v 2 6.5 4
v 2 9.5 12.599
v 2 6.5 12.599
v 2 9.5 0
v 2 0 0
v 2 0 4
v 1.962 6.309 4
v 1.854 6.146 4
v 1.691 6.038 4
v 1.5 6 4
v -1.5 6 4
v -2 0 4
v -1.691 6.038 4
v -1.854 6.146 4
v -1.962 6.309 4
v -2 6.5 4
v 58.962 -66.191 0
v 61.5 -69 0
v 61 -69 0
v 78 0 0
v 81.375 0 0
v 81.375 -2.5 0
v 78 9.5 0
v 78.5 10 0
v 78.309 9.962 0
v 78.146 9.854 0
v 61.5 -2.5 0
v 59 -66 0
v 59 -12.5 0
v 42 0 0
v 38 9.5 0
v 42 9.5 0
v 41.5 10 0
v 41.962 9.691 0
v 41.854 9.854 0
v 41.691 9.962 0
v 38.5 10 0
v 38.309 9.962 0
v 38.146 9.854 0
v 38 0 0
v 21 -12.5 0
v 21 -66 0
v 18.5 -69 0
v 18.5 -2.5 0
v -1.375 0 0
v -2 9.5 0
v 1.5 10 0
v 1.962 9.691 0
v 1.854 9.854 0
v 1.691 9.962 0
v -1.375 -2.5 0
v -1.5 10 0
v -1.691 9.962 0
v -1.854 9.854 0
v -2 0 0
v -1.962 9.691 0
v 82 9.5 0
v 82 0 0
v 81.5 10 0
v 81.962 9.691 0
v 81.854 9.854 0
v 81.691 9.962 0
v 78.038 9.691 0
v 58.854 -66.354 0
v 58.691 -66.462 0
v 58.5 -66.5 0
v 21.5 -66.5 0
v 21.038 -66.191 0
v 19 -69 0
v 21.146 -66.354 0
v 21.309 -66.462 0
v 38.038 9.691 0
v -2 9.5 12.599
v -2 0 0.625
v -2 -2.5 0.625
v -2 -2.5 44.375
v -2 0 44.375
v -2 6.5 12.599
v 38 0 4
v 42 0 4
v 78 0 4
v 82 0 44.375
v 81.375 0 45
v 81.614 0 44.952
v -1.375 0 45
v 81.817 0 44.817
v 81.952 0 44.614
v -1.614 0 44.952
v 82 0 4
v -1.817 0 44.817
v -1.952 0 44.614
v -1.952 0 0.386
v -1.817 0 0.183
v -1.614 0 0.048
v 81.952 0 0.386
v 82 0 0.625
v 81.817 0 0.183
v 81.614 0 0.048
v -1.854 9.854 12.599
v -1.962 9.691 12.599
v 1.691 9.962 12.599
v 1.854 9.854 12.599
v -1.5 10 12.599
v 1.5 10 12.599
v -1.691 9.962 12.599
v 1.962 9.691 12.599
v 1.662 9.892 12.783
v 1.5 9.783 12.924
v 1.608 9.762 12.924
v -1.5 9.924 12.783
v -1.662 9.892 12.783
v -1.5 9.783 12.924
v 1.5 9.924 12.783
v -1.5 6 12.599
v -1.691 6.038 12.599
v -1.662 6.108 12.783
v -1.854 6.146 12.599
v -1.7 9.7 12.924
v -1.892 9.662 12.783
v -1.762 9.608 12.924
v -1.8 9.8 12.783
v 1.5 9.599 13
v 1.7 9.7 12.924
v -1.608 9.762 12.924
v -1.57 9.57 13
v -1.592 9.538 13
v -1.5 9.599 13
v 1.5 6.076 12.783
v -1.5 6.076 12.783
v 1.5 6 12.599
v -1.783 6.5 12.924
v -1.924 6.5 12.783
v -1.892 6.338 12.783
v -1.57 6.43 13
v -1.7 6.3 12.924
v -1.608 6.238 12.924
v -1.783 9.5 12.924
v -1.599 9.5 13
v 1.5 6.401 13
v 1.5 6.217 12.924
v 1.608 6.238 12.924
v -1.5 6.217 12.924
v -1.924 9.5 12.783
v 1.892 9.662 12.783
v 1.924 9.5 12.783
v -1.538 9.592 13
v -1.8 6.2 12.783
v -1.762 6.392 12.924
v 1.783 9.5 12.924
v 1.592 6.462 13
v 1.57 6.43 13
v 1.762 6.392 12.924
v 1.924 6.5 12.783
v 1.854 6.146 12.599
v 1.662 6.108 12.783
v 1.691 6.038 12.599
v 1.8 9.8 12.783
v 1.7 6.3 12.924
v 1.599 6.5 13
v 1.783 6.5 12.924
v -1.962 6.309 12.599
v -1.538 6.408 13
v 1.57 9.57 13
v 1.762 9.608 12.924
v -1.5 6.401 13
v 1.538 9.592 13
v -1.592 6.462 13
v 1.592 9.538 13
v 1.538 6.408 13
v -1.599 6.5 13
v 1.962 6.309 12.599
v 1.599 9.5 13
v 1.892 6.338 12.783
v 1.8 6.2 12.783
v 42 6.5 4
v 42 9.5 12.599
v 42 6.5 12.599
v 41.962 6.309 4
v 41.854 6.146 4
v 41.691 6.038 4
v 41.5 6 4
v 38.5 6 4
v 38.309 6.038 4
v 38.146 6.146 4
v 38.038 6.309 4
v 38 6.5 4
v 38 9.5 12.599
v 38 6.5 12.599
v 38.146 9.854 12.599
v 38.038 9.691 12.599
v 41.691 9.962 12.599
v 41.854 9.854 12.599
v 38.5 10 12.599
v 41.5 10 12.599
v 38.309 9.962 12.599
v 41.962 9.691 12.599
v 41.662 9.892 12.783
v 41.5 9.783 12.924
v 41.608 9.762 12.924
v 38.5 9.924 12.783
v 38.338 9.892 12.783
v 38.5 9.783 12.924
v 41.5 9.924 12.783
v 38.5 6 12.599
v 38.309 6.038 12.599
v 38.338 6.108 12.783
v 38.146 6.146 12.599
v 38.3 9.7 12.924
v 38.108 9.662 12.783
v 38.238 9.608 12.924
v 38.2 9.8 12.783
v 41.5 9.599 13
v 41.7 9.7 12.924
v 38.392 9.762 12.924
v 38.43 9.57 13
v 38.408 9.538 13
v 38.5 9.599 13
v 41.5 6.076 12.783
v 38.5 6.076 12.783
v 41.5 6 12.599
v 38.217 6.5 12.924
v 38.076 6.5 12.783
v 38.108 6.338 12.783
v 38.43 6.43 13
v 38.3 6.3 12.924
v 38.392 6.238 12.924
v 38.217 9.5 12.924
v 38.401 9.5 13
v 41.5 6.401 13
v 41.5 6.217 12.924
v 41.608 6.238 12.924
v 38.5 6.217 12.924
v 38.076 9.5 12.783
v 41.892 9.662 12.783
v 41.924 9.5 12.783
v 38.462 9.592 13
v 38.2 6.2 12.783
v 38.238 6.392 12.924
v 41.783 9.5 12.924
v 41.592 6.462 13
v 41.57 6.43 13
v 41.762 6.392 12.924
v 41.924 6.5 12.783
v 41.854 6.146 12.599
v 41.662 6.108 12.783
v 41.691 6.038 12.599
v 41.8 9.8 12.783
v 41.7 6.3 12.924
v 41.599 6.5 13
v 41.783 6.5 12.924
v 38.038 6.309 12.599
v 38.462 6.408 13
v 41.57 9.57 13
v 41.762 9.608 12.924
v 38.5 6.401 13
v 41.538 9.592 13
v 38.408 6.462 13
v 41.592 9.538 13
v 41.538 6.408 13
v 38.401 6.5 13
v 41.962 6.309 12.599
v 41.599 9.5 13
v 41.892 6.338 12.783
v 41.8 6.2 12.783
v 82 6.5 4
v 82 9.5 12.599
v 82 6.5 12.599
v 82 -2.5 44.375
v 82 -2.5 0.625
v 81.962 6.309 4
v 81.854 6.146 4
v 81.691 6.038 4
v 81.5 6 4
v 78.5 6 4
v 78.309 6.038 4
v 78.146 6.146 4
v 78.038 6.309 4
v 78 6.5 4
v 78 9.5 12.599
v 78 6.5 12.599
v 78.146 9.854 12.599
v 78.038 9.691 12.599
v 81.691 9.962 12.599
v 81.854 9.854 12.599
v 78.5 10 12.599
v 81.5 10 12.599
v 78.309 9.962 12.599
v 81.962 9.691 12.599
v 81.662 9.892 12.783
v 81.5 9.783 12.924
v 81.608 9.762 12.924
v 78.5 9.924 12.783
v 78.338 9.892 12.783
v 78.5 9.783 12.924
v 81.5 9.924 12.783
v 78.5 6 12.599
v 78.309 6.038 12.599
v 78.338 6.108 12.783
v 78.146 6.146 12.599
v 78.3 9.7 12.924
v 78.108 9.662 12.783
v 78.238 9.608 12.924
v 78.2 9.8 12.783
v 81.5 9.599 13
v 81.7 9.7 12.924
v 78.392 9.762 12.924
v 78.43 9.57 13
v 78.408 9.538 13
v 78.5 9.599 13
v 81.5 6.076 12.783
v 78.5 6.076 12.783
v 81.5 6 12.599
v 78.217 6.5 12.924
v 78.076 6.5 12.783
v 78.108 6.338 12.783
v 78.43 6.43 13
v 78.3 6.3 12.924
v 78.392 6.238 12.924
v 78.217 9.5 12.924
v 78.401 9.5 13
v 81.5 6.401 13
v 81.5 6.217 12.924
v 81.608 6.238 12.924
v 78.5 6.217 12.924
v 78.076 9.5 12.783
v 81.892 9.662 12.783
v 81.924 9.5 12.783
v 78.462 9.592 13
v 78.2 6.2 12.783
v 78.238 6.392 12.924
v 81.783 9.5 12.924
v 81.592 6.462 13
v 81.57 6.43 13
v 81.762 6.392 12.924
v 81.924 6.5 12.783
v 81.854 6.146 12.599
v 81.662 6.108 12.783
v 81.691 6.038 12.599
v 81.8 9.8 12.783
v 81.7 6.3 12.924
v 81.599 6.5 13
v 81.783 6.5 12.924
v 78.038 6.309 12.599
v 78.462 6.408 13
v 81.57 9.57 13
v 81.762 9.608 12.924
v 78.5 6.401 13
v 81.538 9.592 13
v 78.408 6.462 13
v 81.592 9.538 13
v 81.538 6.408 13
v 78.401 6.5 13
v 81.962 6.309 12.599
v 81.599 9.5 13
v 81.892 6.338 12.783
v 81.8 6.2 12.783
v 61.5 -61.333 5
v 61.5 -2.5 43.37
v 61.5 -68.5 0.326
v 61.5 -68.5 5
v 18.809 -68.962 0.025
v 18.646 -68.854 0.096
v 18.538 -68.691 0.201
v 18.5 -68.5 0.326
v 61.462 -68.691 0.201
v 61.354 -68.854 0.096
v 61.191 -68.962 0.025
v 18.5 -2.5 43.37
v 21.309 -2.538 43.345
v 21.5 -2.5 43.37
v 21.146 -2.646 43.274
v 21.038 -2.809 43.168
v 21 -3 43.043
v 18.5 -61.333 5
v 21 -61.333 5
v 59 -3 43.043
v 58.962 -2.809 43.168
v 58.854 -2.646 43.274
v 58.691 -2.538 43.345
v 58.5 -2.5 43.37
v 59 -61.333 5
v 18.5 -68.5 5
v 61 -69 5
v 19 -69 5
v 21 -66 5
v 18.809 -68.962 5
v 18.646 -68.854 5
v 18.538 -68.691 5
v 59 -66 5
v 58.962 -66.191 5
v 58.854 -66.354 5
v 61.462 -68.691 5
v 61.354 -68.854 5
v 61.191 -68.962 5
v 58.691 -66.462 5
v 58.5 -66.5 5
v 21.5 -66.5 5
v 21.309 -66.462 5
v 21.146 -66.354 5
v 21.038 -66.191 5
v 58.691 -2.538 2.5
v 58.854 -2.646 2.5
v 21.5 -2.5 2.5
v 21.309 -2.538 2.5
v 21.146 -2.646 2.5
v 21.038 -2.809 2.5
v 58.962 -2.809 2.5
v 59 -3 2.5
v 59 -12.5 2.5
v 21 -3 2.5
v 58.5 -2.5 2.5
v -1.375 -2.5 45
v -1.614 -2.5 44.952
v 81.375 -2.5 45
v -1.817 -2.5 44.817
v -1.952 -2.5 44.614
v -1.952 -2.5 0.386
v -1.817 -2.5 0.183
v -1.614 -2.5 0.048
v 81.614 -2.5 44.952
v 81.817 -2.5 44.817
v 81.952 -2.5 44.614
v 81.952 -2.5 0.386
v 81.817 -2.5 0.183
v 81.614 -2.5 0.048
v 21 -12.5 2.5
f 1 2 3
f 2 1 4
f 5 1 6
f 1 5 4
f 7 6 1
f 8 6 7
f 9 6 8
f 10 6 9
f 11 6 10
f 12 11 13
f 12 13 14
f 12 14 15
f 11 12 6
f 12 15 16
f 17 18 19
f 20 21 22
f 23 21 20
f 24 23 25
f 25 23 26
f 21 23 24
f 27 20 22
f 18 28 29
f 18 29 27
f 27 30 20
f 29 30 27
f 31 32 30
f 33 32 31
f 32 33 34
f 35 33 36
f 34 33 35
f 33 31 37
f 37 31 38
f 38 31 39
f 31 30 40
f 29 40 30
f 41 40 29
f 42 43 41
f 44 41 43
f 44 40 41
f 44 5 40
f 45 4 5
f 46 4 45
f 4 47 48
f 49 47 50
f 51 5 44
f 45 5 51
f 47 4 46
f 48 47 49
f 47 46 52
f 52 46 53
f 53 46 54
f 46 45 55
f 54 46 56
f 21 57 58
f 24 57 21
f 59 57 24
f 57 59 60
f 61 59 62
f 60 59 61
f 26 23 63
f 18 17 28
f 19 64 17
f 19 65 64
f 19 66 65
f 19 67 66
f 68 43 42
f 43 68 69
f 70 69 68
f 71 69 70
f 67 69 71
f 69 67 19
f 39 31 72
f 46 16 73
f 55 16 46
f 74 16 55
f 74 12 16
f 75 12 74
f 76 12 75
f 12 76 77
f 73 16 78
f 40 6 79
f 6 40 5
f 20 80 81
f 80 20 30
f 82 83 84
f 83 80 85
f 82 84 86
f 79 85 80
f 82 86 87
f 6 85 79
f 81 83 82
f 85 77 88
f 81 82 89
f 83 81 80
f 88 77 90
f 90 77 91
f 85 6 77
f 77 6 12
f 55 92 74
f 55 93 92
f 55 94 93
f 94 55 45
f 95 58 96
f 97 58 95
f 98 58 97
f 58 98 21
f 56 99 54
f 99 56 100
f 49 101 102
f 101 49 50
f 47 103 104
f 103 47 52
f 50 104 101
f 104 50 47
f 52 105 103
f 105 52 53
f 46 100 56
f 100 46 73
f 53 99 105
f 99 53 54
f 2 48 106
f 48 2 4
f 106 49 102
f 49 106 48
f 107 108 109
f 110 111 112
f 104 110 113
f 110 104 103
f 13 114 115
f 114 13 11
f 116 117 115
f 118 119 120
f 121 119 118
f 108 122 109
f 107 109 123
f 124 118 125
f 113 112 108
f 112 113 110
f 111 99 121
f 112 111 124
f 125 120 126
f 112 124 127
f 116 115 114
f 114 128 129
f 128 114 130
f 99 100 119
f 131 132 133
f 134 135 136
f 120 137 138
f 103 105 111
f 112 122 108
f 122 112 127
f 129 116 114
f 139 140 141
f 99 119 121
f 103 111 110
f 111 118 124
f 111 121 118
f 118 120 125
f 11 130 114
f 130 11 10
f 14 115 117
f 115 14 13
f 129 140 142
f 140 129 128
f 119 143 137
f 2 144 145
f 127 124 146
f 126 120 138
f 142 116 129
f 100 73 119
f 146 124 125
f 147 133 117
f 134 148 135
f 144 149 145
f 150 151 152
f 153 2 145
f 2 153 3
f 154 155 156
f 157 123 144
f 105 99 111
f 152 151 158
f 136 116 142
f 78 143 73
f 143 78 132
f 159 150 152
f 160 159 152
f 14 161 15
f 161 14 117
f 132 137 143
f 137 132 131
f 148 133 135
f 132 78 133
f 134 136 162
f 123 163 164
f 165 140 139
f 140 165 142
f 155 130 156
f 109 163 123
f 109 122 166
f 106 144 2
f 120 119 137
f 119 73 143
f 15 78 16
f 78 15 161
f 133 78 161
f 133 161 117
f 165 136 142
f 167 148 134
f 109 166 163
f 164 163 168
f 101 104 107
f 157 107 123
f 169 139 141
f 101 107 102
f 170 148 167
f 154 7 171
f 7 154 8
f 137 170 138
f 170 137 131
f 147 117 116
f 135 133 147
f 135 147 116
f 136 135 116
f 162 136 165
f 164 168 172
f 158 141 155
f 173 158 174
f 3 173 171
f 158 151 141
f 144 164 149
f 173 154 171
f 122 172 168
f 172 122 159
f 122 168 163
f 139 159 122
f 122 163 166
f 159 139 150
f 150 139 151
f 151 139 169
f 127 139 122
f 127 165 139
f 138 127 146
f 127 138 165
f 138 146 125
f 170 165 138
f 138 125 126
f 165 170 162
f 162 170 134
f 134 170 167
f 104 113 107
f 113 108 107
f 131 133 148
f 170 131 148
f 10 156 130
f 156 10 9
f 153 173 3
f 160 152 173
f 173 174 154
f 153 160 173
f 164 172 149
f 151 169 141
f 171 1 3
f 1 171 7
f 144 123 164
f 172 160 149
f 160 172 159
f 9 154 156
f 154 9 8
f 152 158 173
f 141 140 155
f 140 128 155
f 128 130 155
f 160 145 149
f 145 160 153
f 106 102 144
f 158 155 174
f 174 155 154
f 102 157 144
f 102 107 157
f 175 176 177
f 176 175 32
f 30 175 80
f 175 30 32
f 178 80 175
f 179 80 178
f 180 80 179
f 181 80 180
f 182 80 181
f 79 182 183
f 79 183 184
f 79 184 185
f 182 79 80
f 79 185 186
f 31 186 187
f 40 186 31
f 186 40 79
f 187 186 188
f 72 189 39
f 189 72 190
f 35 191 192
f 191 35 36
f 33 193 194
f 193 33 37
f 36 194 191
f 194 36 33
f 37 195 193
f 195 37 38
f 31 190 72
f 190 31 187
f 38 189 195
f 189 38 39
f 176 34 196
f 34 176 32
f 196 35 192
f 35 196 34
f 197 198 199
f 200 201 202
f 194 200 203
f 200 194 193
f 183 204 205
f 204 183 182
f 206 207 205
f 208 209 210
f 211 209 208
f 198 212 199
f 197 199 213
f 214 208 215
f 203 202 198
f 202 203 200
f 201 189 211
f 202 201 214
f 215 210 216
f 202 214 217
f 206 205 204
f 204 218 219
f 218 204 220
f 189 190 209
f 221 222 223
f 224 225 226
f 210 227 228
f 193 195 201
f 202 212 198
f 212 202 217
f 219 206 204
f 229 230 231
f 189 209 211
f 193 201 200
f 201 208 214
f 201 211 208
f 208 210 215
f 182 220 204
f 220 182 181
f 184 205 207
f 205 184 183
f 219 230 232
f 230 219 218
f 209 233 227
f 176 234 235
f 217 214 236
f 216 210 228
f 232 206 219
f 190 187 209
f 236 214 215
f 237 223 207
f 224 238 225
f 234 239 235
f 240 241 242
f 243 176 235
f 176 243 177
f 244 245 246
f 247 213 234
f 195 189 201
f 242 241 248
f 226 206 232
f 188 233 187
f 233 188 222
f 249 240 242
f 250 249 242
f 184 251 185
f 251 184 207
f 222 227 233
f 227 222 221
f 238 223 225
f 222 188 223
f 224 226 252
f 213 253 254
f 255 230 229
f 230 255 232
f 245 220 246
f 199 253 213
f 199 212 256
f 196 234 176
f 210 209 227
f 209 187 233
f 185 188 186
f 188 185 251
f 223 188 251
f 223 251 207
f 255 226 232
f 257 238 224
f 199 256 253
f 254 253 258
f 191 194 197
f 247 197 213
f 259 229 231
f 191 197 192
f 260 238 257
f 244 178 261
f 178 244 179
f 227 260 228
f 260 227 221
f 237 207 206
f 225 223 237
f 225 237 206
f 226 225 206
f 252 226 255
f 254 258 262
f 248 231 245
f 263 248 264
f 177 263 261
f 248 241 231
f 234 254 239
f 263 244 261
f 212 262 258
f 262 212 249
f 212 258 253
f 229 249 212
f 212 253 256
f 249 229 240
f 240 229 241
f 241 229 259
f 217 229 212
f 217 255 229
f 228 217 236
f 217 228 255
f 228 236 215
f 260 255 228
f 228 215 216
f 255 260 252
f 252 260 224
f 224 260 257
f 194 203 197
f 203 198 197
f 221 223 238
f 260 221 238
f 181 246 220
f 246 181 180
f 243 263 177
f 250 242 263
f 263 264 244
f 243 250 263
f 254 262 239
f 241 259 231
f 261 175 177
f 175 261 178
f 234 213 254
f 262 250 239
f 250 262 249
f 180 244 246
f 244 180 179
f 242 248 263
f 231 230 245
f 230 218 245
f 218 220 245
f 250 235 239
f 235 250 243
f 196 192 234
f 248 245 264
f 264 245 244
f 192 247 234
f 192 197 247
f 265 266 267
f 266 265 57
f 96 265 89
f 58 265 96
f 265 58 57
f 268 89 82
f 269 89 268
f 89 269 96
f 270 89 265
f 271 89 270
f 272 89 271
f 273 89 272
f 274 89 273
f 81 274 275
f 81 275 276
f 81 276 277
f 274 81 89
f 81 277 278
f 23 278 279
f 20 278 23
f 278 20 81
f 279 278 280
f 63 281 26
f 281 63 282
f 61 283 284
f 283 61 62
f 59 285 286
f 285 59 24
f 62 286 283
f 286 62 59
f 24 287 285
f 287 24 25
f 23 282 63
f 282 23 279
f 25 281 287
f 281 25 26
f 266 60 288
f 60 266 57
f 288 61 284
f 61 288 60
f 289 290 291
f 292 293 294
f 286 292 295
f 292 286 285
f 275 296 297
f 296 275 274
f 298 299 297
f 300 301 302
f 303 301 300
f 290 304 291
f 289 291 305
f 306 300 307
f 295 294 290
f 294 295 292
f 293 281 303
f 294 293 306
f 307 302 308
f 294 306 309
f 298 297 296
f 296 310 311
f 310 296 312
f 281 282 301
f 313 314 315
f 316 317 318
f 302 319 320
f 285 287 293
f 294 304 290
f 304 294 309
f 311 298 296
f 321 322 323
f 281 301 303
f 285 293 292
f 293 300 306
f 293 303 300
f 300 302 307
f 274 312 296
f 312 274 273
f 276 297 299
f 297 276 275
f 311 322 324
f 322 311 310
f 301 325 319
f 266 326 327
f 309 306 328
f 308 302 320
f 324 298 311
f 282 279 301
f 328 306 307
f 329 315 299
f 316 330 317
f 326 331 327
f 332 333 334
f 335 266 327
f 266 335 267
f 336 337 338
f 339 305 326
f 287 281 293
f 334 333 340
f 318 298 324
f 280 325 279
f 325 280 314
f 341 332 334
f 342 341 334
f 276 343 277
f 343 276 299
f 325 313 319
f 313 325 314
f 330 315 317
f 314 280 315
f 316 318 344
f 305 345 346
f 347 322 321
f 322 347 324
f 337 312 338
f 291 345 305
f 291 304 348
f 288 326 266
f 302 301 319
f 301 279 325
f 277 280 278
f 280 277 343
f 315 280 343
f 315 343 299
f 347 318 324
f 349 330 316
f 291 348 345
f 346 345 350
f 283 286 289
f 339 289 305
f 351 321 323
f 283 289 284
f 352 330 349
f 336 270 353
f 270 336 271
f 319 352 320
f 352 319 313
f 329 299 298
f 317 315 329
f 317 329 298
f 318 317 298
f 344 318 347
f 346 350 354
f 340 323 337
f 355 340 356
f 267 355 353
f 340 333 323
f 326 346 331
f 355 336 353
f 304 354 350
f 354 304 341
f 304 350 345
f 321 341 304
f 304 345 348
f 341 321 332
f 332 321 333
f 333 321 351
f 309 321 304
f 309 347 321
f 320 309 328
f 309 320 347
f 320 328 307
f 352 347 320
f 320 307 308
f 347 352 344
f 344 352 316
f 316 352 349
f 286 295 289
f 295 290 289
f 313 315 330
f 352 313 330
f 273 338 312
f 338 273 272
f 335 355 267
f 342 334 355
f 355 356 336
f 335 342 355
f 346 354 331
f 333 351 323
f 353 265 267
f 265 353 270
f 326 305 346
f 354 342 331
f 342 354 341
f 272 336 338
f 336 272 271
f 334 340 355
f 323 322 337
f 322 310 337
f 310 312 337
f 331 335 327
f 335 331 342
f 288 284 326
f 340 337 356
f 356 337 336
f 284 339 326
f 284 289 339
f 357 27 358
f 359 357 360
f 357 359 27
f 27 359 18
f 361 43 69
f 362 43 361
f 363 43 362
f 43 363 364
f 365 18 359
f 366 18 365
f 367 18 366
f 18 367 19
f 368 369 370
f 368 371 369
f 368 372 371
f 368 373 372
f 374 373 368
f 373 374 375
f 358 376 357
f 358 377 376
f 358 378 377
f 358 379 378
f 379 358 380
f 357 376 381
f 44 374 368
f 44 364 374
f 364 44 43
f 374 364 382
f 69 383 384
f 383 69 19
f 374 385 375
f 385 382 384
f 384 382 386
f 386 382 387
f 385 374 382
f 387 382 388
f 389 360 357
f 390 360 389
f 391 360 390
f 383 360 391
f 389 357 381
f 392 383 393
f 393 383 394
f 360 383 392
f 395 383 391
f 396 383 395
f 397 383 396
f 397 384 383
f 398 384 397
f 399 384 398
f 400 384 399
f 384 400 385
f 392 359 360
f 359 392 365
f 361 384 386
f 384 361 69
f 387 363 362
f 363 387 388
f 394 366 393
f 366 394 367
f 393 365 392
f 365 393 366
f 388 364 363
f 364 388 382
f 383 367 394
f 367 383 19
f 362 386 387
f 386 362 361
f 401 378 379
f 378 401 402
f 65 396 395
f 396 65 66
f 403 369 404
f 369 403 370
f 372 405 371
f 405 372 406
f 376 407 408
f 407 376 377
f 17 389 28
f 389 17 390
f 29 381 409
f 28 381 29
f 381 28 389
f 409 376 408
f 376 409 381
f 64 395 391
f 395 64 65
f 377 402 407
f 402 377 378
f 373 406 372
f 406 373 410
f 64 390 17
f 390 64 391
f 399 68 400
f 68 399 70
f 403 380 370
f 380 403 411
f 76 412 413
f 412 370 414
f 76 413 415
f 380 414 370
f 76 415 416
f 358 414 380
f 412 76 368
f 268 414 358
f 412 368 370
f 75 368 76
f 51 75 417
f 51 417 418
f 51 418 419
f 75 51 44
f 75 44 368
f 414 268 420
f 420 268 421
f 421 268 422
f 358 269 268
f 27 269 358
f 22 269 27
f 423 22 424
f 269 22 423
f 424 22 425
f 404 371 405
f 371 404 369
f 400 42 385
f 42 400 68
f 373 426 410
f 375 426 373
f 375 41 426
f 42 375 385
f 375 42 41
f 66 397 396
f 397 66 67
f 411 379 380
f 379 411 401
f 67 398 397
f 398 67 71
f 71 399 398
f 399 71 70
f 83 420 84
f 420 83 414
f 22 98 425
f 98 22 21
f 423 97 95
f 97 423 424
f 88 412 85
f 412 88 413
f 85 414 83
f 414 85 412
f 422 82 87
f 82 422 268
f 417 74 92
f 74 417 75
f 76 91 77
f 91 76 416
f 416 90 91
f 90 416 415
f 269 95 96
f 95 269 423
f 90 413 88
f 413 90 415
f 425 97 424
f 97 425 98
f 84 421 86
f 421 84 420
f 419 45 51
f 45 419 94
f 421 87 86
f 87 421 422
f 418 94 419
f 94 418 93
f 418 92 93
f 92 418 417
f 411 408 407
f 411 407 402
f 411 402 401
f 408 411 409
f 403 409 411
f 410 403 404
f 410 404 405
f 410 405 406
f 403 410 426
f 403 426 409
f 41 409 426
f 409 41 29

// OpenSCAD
// You only need to edit the varibales prefixed with user_

// The box inner length / depth in mm
user_inner_box_length = 54; // [1:300]
// The box inner height in mm
user_inner_box_height = 40 ; // [1:300]
// The box inner width in mm
user_inner_box_width = 38; // [1:300]
// The box wall width in mm
user_wall_width = 2.5; // [1:10]
// The minimum number of hooks
user_min_hook_count = 3; // [2:20]
// The box start offset in mm
user_box_start_offset = 10; // [0:100]

// You can stop editing after this line if you do not want to brick this script ;) 

if (version()[0] < 2019) {
  echo("WARNING: This script is only tested with 2019.01!");
}

assert(undef != user_inner_box_length, "Value \"user_inner_box_length\" must be specified!");
assert(user_inner_box_length >= 1, "The minimum value is 1mm!");
assert(user_inner_box_length <= 300, "The maximum value is 300mm!");

assert(undef != user_inner_box_height, "Value \"user_inner_box_height\" must be specified!");
assert(user_inner_box_height >= 1, "The minimum value is 1mm!");
assert(user_inner_box_height <= 300, "The maximum value is 300mm!");

assert(undef != user_inner_box_width, "Value \"user_inner_box_width\" must be specified!");
assert(user_inner_box_width >= 1, "The minimum value is 1mm!");
assert(user_inner_box_width <= 300, "The maximum value is 300mm!");

assert(undef != user_wall_width, "Value \"user_wall_width\" must be specified!");
assert(user_wall_width >= 1, "The minimum value is 1mm!");
assert(user_wall_width <= 10, "The maximum value is 10mm!");

assert(undef != user_min_hook_count, "Value \"user_min_hook_count\" must be specified!");
assert(user_min_hook_count >= 2);
assert(user_min_hook_count <= 20);

assert(undef != user_box_start_offset, "Value \"user_box_start_offset\" must be specified!");
assert(user_box_start_offset >= 0);
assert(user_box_start_offset <= 100);

caco_create_ikea_skadis_pistol_style_tool_holder(
  user_inner_box_length, 
  user_inner_box_height, 
  user_inner_box_width, 
  user_wall_width,
  (user_min_hook_count - 1) * 40,
  4,
  user_box_start_offset
);

/*
 * License: MIT License
 * 
 * Copyright (c) 2019 "Guido Krömer" <mail@cacodaemon.de>
 * 
 * Permission is hereby granted, free of charge, to any person obtaining a copy of this software and associated documentation files (the "Software"), to deal in the Software without restriction, including without limitation the rights to use, copy, modify, merge, publish, distribute, sublicense, and/or sell copies of the Software, and to permit persons to whom the Software is furnished to do so, subject to the following conditions:
 * 
 * The above copyright notice and this permission notice shall be included in all copies or substantial portions of the Software.
 * 
 * THE SOFTWARE IS PROVIDED "AS IS", WITHOUT WARRANTY OF ANY KIND, EXPRESS OR IMPLIED, INCLUDING BUT NOT LIMITED TO THE WARRANTIES OF MERCHANTABILITY, FITNESS FOR A PARTICULAR PURPOSE AND NONINFRINGEMENT. IN NO EVENT SHALL THE AUTHORS OR COPYRIGHT HOLDERS BE LIABLE FOR ANY CLAIM, DAMAGES OR OTHER LIABILITY, WHETHER IN AN ACTION OF CONTRACT, TORT OR OTHERWISE, ARISING FROM, OUT OF OR IN CONNECTION WITH THE SOFTWARE OR THE USE OR OTHER DEALINGS IN THE SOFTWARE. 
 */
module caco_create_rounded_corner_cube(size, radius = 1, resolution = 5, mode = "all_sides") { 
  half_radius = radius / 2;

  if (mode == "all_sides") {
    translate([half_radius, half_radius, half_radius]) 
    minkowski() { 
      resize(newsize = [radius, radius, radius]) 
      sphere(r = resolution);
      cube([size[0] - radius, size[1] - radius, size[2] - radius], false);
    }
  } else if (mode == "vertical_sides") {
    translate([half_radius, half_radius, 0]) 
    minkowski() { 
      resize(newsize = [radius, radius, radius]) 
      cylinder(r = resolution, h = resolution);
      cube([size[0] - radius, size[1] - radius, size[2] - radius], false);
    }
  } else if (mode == "horizontal_sides") {
    translate([half_radius, radius, half_radius]) 
    minkowski() { 
      resize(newsize = [radius, radius, radius]) 
      rotate([90,0,0]) 
      cylinder(r = resolution, h = resolution);
      cube([size[0] - radius, size[1] - radius, size[2] - radius], false);
    }
  } else {
    cube(size);
  }
}

module caco_create_hollow_rounded_corner_cube_vertical_sides(size, radius = 1, resolution = 5, wall_width = 1.5) {
  difference() {
    caco_create_rounded_corner_cube(size = size, radius = radius, resolution = resolution, mode = "vertical_sides");
    translate([wall_width, wall_width, -wall_width]) 
    cube([size[0] - wall_width * 2, size[1] - wall_width * 2, size[2]]);
  }
}

module caco_create_hook(side_lenght, length) {
  union() {
    cube([side_lenght, side_lenght, side_lenght]);
    caco_create_rounded_corner_cube([side_lenght, length, side_lenght], mode = "vertical_sides");
    translate([0, length - side_lenght, side_lenght - 1]) 
    caco_create_rounded_corner_cube([side_lenght, side_lenght, length]);
  }
}
   
module caco_create_hooks(width, hook_side_lenght, hook_length = 10) {
  union() {
    for(variable = [0 : 40 : width]) {
      translate([variable, 0, 0]) 
      caco_create_hook(side_lenght = hook_side_lenght, length = hook_length);
    }
  }
}

module caco_create_triangle(size) {
  rotate([0 ,0, -90]) 
  rotate([90, 0, 0]) 
  linear_extrude(height = size[0])
  polygon([[0, 0], [size[1], 0], [0, size[2]]]);
}

module caco_create_ikea_skadis_pistol_style_tool_holder(inner_box_length, inner_box_height, inner_box_width, wall_width = 1, static_slot_distance = 40, static_hook_side_lengt = 4, box_start_offset = 0) {
  inner_box_length = inner_box_length + box_start_offset;
  box_length = inner_box_length + wall_width * 2;
  box_height = inner_box_height + wall_width * 2;
  box_width = inner_box_width + wall_width * 2;
  box_width_back = max([static_slot_distance, box_width]);
  offset = ((box_width_back - (floor(box_width_back/static_slot_distance)*static_slot_distance)) / 2) - (static_hook_side_lengt/2);
  
  render() {
    translate([offset, 0, 0]) 
    caco_create_hooks(width = box_width_back, hook_side_lenght = static_hook_side_lengt);

    translate([offset, -wall_width, 0]) 
    caco_create_rounded_corner_cube([box_width_back - offset * 2, wall_width, box_height], radius = wall_width / 2, mode = "horizontal_sides");

    difference() {
      union() {
        translate([((box_width_back - box_width)/2)+box_width, 0, 0])
        caco_create_triangle([box_width, box_length, box_height]);

        translate([(box_width_back - box_width)/2, -box_length, 0]) 
        caco_create_rounded_corner_cube([box_width, box_length, wall_width * 2], mode = "vertical_sides");
      }

      translate([wall_width, wall_width, 0])
      translate([(box_width_back - box_width)/2, -box_length, 0])
      caco_create_rounded_corner_cube([inner_box_width, inner_box_length, box_height], mode = "vertical_sides");
    }

    if (box_start_offset > 0) {
        translate([(box_width_back - box_width)/2, -box_start_offset -wall_width, 0])
        caco_create_rounded_corner_cube([box_width, box_start_offset, wall_width], mode = "none");
    }
  }
}
